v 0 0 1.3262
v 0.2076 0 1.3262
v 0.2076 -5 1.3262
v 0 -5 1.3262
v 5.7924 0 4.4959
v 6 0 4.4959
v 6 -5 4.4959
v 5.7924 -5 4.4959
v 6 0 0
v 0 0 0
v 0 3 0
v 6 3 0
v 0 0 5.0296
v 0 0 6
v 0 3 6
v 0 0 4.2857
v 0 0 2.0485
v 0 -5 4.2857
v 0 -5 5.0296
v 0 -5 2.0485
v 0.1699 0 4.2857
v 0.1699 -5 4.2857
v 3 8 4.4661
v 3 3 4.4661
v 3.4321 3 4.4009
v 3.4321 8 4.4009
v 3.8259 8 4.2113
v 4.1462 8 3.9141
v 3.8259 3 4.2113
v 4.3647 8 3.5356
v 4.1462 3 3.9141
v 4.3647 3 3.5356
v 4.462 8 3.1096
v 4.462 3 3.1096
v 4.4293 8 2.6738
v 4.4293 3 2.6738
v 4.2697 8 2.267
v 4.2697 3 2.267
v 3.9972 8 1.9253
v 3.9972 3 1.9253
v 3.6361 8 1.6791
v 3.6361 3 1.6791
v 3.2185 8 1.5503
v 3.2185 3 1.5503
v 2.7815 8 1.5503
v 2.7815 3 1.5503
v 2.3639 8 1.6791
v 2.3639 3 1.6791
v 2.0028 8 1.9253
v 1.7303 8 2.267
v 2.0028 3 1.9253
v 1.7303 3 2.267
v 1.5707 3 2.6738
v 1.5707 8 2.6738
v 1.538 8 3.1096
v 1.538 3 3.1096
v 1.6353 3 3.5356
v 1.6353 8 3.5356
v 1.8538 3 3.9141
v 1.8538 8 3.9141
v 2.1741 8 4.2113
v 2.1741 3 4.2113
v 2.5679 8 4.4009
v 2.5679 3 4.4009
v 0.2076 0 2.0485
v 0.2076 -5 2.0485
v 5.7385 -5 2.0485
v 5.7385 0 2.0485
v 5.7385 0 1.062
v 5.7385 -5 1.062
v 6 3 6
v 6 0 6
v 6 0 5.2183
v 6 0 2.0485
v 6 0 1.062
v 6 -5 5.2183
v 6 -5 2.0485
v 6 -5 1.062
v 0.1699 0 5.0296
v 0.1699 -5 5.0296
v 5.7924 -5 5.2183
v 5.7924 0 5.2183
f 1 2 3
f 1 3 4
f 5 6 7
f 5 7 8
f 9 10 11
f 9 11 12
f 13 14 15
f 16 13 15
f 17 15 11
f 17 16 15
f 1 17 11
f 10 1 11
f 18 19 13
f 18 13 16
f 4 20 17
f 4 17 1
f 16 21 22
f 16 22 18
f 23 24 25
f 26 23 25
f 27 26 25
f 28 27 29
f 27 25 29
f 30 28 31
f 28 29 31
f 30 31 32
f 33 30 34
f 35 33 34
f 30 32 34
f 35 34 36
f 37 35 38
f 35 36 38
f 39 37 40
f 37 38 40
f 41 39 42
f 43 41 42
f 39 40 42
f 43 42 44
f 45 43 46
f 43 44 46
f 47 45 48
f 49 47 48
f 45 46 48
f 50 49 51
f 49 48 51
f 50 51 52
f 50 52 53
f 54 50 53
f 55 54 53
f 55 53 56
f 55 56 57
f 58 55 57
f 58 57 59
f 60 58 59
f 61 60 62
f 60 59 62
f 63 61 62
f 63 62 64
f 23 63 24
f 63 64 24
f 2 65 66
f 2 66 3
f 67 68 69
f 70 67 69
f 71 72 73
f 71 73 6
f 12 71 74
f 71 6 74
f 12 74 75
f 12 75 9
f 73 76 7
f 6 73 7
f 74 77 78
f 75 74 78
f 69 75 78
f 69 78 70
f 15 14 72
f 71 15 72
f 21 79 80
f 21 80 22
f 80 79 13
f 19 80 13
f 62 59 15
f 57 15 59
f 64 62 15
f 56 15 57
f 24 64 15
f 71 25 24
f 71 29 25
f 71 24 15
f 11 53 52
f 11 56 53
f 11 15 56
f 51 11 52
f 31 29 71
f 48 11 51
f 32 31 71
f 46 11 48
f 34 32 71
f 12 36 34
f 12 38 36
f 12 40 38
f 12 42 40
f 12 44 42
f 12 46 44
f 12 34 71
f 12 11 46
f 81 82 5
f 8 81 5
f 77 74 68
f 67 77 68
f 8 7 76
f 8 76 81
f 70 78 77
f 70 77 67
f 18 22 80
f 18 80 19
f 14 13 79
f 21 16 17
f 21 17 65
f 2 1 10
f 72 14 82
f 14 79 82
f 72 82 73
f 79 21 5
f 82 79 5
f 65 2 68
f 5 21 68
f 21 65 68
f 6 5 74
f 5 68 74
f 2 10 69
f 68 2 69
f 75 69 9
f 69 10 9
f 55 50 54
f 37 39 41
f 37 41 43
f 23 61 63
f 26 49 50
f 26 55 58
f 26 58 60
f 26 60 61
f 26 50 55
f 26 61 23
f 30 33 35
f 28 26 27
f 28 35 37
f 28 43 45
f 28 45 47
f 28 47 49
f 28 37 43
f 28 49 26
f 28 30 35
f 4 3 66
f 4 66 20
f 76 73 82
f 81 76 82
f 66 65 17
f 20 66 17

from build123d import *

# Parameters (mm, degrees)
SKETCH1_W           = 6
SKETCH1_H           = 6
BOSS_EXTRUDE1_DEPTH = 3
SKETCH2_R           = 1.46607231
BOSS_EXTRUDE2_DEPTH = 5
SKETCH3_W           = 0.169867938
SKETCH3_H           = 0.743920428
SKETCH3_W_2         = 0.207603032
SKETCH3_H_2         = 0.722357517
SKETCH3_W_3         = 0.261510309
SKETCH3_H_3         = 0.986503176
BOSS_EXTRUDE3_DEPTH = 5


with BuildPart() as part:
    # Sketch1 → Boss-Extrude1 (new body)
    with BuildSketch(Plane(origin=(0, 0, 0), x_dir=(1, 0, 0), z_dir=(0, 1, 0))):
        with Locations((3, -3)):
            Rectangle(SKETCH1_W, SKETCH1_H)
    extrude(amount=BOSS_EXTRUDE1_DEPTH)

    # Sketch2 → Boss-Extrude2 (add)
    with BuildSketch(Plane(origin=(0, 3, 0), x_dir=(1, 0, 0), z_dir=(0, 1, 0))):
        with Locations(Location((3, -3, 0), (0, 0, 270))):
            Circle(SKETCH2_R)
    extrude(amount=BOSS_EXTRUDE2_DEPTH)

    # Sketch3 → Boss-Extrude3 (add)
    with BuildSketch(Plane(origin=(0, 0, 0), x_dir=(-1, 0, 0), z_dir=(0, -1, 0))):
        with Locations((-0.084933969, -4.657648779)):
            Rectangle(SKETCH3_W, SKETCH3_H)
        with Locations((-0.103801516, -1.687357796)):
            Rectangle(SKETCH3_W_2, SKETCH3_H_2)
        with Locations((-5.896198484, -4.857105706)):
            Rectangle(SKETCH3_W_2, SKETCH3_H_2)
        with Locations((-5.869244846, -1.555284966)):
            Rectangle(SKETCH3_W_3, SKETCH3_H_3)
    extrude(amount=BOSS_EXTRUDE3_DEPTH)


solid = part.part
